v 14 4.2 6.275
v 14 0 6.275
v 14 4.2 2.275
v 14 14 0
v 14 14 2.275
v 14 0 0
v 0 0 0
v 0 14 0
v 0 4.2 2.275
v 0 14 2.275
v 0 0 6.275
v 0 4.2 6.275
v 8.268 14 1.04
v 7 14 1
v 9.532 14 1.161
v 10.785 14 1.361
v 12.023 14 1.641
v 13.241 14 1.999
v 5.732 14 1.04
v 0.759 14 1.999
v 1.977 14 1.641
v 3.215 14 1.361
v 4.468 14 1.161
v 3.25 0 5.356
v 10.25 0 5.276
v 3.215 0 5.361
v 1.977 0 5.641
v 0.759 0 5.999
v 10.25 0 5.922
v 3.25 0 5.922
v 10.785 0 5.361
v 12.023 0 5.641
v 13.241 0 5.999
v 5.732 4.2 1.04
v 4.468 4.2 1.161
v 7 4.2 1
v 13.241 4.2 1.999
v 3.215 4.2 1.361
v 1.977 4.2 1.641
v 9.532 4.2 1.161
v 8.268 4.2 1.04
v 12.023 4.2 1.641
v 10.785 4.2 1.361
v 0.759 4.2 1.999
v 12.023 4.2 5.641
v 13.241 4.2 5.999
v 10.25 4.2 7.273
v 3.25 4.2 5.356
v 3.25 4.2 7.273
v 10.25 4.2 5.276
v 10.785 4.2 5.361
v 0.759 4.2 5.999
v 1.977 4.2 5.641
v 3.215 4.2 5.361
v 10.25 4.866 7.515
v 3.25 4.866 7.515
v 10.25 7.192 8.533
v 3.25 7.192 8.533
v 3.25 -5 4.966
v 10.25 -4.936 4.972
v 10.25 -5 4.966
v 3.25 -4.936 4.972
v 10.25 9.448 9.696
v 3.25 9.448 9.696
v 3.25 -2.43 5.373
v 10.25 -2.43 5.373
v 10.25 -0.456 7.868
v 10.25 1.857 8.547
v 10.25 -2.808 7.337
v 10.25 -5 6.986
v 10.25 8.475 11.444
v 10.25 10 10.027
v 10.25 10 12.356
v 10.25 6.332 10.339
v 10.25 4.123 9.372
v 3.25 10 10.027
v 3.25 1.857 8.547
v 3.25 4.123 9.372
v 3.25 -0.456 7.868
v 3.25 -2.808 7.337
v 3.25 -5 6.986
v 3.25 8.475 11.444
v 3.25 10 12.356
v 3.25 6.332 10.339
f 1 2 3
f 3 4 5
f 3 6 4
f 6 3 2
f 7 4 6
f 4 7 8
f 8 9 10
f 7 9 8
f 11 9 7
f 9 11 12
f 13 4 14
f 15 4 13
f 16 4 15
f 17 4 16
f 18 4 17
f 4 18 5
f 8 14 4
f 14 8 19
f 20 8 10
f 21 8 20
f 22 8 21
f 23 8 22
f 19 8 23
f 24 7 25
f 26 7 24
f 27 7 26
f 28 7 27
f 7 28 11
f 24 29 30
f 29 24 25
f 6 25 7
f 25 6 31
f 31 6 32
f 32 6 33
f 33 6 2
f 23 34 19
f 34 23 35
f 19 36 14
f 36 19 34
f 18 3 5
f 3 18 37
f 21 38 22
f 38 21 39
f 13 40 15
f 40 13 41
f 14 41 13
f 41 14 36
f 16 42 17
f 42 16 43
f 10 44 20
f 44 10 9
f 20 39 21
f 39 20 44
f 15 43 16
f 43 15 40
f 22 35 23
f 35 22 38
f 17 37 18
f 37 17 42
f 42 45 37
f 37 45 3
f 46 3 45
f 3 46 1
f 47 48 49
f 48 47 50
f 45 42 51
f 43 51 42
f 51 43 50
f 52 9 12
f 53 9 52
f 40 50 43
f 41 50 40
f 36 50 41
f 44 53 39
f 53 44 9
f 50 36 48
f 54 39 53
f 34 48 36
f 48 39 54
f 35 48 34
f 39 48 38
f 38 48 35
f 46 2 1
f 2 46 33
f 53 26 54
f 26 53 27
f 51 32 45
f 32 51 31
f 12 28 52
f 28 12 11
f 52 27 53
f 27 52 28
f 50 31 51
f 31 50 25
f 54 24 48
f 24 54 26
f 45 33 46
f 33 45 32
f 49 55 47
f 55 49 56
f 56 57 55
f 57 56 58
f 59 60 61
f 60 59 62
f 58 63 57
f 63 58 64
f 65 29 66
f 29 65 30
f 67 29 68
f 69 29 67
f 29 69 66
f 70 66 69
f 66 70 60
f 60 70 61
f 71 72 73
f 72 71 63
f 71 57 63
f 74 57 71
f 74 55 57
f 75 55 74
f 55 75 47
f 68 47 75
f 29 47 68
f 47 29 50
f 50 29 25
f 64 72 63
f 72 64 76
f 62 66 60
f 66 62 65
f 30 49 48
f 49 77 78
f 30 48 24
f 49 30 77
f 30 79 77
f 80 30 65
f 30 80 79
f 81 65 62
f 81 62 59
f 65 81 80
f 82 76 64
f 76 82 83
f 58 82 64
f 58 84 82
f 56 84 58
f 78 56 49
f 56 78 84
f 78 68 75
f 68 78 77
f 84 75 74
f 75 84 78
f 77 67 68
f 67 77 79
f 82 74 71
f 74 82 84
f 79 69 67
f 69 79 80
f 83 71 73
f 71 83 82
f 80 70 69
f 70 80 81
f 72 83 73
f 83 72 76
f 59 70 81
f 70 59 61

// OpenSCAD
//resolution of curves
$fn=99;

//base plate
difference () {
    cube ([14,14,2.4]);
    
    translate ([7,3,21])
    rotate ([0,90,90])
    cylinder(h=20,r=20);
}

//riser
difference () {
    cube ([14,4.2,6.4]);
    
    translate ([7,-1,25])
    rotate ([0,90,90])
    cylinder(h=20,r=20);    
}


//standoff
translate ([3.25,0,0])
cube ([7,4.2,8]);

//curved thingy
difference () {
    union () {
        //hallow cylinder
        translate ([3.25,-10,44.65])
        difference () {
            rotate ([0,90,0])
            cylinder(h=7,r=40);
            
            translate ([-1,0,0])
            rotate ([0,90,0])
            cylinder(h=22,r=40-2);
        }
    }

    //cut down hallow cylinder
    translate ([0,10,0])
    cube ([100,100,100]); 
    //cut down hallow cylinder
    translate ([0,-105,0])
    cube ([100,100,100]);
    //cut down hallow cylinder
    translate ([0,-10,40])
    cube ([100,100,100]);
}
